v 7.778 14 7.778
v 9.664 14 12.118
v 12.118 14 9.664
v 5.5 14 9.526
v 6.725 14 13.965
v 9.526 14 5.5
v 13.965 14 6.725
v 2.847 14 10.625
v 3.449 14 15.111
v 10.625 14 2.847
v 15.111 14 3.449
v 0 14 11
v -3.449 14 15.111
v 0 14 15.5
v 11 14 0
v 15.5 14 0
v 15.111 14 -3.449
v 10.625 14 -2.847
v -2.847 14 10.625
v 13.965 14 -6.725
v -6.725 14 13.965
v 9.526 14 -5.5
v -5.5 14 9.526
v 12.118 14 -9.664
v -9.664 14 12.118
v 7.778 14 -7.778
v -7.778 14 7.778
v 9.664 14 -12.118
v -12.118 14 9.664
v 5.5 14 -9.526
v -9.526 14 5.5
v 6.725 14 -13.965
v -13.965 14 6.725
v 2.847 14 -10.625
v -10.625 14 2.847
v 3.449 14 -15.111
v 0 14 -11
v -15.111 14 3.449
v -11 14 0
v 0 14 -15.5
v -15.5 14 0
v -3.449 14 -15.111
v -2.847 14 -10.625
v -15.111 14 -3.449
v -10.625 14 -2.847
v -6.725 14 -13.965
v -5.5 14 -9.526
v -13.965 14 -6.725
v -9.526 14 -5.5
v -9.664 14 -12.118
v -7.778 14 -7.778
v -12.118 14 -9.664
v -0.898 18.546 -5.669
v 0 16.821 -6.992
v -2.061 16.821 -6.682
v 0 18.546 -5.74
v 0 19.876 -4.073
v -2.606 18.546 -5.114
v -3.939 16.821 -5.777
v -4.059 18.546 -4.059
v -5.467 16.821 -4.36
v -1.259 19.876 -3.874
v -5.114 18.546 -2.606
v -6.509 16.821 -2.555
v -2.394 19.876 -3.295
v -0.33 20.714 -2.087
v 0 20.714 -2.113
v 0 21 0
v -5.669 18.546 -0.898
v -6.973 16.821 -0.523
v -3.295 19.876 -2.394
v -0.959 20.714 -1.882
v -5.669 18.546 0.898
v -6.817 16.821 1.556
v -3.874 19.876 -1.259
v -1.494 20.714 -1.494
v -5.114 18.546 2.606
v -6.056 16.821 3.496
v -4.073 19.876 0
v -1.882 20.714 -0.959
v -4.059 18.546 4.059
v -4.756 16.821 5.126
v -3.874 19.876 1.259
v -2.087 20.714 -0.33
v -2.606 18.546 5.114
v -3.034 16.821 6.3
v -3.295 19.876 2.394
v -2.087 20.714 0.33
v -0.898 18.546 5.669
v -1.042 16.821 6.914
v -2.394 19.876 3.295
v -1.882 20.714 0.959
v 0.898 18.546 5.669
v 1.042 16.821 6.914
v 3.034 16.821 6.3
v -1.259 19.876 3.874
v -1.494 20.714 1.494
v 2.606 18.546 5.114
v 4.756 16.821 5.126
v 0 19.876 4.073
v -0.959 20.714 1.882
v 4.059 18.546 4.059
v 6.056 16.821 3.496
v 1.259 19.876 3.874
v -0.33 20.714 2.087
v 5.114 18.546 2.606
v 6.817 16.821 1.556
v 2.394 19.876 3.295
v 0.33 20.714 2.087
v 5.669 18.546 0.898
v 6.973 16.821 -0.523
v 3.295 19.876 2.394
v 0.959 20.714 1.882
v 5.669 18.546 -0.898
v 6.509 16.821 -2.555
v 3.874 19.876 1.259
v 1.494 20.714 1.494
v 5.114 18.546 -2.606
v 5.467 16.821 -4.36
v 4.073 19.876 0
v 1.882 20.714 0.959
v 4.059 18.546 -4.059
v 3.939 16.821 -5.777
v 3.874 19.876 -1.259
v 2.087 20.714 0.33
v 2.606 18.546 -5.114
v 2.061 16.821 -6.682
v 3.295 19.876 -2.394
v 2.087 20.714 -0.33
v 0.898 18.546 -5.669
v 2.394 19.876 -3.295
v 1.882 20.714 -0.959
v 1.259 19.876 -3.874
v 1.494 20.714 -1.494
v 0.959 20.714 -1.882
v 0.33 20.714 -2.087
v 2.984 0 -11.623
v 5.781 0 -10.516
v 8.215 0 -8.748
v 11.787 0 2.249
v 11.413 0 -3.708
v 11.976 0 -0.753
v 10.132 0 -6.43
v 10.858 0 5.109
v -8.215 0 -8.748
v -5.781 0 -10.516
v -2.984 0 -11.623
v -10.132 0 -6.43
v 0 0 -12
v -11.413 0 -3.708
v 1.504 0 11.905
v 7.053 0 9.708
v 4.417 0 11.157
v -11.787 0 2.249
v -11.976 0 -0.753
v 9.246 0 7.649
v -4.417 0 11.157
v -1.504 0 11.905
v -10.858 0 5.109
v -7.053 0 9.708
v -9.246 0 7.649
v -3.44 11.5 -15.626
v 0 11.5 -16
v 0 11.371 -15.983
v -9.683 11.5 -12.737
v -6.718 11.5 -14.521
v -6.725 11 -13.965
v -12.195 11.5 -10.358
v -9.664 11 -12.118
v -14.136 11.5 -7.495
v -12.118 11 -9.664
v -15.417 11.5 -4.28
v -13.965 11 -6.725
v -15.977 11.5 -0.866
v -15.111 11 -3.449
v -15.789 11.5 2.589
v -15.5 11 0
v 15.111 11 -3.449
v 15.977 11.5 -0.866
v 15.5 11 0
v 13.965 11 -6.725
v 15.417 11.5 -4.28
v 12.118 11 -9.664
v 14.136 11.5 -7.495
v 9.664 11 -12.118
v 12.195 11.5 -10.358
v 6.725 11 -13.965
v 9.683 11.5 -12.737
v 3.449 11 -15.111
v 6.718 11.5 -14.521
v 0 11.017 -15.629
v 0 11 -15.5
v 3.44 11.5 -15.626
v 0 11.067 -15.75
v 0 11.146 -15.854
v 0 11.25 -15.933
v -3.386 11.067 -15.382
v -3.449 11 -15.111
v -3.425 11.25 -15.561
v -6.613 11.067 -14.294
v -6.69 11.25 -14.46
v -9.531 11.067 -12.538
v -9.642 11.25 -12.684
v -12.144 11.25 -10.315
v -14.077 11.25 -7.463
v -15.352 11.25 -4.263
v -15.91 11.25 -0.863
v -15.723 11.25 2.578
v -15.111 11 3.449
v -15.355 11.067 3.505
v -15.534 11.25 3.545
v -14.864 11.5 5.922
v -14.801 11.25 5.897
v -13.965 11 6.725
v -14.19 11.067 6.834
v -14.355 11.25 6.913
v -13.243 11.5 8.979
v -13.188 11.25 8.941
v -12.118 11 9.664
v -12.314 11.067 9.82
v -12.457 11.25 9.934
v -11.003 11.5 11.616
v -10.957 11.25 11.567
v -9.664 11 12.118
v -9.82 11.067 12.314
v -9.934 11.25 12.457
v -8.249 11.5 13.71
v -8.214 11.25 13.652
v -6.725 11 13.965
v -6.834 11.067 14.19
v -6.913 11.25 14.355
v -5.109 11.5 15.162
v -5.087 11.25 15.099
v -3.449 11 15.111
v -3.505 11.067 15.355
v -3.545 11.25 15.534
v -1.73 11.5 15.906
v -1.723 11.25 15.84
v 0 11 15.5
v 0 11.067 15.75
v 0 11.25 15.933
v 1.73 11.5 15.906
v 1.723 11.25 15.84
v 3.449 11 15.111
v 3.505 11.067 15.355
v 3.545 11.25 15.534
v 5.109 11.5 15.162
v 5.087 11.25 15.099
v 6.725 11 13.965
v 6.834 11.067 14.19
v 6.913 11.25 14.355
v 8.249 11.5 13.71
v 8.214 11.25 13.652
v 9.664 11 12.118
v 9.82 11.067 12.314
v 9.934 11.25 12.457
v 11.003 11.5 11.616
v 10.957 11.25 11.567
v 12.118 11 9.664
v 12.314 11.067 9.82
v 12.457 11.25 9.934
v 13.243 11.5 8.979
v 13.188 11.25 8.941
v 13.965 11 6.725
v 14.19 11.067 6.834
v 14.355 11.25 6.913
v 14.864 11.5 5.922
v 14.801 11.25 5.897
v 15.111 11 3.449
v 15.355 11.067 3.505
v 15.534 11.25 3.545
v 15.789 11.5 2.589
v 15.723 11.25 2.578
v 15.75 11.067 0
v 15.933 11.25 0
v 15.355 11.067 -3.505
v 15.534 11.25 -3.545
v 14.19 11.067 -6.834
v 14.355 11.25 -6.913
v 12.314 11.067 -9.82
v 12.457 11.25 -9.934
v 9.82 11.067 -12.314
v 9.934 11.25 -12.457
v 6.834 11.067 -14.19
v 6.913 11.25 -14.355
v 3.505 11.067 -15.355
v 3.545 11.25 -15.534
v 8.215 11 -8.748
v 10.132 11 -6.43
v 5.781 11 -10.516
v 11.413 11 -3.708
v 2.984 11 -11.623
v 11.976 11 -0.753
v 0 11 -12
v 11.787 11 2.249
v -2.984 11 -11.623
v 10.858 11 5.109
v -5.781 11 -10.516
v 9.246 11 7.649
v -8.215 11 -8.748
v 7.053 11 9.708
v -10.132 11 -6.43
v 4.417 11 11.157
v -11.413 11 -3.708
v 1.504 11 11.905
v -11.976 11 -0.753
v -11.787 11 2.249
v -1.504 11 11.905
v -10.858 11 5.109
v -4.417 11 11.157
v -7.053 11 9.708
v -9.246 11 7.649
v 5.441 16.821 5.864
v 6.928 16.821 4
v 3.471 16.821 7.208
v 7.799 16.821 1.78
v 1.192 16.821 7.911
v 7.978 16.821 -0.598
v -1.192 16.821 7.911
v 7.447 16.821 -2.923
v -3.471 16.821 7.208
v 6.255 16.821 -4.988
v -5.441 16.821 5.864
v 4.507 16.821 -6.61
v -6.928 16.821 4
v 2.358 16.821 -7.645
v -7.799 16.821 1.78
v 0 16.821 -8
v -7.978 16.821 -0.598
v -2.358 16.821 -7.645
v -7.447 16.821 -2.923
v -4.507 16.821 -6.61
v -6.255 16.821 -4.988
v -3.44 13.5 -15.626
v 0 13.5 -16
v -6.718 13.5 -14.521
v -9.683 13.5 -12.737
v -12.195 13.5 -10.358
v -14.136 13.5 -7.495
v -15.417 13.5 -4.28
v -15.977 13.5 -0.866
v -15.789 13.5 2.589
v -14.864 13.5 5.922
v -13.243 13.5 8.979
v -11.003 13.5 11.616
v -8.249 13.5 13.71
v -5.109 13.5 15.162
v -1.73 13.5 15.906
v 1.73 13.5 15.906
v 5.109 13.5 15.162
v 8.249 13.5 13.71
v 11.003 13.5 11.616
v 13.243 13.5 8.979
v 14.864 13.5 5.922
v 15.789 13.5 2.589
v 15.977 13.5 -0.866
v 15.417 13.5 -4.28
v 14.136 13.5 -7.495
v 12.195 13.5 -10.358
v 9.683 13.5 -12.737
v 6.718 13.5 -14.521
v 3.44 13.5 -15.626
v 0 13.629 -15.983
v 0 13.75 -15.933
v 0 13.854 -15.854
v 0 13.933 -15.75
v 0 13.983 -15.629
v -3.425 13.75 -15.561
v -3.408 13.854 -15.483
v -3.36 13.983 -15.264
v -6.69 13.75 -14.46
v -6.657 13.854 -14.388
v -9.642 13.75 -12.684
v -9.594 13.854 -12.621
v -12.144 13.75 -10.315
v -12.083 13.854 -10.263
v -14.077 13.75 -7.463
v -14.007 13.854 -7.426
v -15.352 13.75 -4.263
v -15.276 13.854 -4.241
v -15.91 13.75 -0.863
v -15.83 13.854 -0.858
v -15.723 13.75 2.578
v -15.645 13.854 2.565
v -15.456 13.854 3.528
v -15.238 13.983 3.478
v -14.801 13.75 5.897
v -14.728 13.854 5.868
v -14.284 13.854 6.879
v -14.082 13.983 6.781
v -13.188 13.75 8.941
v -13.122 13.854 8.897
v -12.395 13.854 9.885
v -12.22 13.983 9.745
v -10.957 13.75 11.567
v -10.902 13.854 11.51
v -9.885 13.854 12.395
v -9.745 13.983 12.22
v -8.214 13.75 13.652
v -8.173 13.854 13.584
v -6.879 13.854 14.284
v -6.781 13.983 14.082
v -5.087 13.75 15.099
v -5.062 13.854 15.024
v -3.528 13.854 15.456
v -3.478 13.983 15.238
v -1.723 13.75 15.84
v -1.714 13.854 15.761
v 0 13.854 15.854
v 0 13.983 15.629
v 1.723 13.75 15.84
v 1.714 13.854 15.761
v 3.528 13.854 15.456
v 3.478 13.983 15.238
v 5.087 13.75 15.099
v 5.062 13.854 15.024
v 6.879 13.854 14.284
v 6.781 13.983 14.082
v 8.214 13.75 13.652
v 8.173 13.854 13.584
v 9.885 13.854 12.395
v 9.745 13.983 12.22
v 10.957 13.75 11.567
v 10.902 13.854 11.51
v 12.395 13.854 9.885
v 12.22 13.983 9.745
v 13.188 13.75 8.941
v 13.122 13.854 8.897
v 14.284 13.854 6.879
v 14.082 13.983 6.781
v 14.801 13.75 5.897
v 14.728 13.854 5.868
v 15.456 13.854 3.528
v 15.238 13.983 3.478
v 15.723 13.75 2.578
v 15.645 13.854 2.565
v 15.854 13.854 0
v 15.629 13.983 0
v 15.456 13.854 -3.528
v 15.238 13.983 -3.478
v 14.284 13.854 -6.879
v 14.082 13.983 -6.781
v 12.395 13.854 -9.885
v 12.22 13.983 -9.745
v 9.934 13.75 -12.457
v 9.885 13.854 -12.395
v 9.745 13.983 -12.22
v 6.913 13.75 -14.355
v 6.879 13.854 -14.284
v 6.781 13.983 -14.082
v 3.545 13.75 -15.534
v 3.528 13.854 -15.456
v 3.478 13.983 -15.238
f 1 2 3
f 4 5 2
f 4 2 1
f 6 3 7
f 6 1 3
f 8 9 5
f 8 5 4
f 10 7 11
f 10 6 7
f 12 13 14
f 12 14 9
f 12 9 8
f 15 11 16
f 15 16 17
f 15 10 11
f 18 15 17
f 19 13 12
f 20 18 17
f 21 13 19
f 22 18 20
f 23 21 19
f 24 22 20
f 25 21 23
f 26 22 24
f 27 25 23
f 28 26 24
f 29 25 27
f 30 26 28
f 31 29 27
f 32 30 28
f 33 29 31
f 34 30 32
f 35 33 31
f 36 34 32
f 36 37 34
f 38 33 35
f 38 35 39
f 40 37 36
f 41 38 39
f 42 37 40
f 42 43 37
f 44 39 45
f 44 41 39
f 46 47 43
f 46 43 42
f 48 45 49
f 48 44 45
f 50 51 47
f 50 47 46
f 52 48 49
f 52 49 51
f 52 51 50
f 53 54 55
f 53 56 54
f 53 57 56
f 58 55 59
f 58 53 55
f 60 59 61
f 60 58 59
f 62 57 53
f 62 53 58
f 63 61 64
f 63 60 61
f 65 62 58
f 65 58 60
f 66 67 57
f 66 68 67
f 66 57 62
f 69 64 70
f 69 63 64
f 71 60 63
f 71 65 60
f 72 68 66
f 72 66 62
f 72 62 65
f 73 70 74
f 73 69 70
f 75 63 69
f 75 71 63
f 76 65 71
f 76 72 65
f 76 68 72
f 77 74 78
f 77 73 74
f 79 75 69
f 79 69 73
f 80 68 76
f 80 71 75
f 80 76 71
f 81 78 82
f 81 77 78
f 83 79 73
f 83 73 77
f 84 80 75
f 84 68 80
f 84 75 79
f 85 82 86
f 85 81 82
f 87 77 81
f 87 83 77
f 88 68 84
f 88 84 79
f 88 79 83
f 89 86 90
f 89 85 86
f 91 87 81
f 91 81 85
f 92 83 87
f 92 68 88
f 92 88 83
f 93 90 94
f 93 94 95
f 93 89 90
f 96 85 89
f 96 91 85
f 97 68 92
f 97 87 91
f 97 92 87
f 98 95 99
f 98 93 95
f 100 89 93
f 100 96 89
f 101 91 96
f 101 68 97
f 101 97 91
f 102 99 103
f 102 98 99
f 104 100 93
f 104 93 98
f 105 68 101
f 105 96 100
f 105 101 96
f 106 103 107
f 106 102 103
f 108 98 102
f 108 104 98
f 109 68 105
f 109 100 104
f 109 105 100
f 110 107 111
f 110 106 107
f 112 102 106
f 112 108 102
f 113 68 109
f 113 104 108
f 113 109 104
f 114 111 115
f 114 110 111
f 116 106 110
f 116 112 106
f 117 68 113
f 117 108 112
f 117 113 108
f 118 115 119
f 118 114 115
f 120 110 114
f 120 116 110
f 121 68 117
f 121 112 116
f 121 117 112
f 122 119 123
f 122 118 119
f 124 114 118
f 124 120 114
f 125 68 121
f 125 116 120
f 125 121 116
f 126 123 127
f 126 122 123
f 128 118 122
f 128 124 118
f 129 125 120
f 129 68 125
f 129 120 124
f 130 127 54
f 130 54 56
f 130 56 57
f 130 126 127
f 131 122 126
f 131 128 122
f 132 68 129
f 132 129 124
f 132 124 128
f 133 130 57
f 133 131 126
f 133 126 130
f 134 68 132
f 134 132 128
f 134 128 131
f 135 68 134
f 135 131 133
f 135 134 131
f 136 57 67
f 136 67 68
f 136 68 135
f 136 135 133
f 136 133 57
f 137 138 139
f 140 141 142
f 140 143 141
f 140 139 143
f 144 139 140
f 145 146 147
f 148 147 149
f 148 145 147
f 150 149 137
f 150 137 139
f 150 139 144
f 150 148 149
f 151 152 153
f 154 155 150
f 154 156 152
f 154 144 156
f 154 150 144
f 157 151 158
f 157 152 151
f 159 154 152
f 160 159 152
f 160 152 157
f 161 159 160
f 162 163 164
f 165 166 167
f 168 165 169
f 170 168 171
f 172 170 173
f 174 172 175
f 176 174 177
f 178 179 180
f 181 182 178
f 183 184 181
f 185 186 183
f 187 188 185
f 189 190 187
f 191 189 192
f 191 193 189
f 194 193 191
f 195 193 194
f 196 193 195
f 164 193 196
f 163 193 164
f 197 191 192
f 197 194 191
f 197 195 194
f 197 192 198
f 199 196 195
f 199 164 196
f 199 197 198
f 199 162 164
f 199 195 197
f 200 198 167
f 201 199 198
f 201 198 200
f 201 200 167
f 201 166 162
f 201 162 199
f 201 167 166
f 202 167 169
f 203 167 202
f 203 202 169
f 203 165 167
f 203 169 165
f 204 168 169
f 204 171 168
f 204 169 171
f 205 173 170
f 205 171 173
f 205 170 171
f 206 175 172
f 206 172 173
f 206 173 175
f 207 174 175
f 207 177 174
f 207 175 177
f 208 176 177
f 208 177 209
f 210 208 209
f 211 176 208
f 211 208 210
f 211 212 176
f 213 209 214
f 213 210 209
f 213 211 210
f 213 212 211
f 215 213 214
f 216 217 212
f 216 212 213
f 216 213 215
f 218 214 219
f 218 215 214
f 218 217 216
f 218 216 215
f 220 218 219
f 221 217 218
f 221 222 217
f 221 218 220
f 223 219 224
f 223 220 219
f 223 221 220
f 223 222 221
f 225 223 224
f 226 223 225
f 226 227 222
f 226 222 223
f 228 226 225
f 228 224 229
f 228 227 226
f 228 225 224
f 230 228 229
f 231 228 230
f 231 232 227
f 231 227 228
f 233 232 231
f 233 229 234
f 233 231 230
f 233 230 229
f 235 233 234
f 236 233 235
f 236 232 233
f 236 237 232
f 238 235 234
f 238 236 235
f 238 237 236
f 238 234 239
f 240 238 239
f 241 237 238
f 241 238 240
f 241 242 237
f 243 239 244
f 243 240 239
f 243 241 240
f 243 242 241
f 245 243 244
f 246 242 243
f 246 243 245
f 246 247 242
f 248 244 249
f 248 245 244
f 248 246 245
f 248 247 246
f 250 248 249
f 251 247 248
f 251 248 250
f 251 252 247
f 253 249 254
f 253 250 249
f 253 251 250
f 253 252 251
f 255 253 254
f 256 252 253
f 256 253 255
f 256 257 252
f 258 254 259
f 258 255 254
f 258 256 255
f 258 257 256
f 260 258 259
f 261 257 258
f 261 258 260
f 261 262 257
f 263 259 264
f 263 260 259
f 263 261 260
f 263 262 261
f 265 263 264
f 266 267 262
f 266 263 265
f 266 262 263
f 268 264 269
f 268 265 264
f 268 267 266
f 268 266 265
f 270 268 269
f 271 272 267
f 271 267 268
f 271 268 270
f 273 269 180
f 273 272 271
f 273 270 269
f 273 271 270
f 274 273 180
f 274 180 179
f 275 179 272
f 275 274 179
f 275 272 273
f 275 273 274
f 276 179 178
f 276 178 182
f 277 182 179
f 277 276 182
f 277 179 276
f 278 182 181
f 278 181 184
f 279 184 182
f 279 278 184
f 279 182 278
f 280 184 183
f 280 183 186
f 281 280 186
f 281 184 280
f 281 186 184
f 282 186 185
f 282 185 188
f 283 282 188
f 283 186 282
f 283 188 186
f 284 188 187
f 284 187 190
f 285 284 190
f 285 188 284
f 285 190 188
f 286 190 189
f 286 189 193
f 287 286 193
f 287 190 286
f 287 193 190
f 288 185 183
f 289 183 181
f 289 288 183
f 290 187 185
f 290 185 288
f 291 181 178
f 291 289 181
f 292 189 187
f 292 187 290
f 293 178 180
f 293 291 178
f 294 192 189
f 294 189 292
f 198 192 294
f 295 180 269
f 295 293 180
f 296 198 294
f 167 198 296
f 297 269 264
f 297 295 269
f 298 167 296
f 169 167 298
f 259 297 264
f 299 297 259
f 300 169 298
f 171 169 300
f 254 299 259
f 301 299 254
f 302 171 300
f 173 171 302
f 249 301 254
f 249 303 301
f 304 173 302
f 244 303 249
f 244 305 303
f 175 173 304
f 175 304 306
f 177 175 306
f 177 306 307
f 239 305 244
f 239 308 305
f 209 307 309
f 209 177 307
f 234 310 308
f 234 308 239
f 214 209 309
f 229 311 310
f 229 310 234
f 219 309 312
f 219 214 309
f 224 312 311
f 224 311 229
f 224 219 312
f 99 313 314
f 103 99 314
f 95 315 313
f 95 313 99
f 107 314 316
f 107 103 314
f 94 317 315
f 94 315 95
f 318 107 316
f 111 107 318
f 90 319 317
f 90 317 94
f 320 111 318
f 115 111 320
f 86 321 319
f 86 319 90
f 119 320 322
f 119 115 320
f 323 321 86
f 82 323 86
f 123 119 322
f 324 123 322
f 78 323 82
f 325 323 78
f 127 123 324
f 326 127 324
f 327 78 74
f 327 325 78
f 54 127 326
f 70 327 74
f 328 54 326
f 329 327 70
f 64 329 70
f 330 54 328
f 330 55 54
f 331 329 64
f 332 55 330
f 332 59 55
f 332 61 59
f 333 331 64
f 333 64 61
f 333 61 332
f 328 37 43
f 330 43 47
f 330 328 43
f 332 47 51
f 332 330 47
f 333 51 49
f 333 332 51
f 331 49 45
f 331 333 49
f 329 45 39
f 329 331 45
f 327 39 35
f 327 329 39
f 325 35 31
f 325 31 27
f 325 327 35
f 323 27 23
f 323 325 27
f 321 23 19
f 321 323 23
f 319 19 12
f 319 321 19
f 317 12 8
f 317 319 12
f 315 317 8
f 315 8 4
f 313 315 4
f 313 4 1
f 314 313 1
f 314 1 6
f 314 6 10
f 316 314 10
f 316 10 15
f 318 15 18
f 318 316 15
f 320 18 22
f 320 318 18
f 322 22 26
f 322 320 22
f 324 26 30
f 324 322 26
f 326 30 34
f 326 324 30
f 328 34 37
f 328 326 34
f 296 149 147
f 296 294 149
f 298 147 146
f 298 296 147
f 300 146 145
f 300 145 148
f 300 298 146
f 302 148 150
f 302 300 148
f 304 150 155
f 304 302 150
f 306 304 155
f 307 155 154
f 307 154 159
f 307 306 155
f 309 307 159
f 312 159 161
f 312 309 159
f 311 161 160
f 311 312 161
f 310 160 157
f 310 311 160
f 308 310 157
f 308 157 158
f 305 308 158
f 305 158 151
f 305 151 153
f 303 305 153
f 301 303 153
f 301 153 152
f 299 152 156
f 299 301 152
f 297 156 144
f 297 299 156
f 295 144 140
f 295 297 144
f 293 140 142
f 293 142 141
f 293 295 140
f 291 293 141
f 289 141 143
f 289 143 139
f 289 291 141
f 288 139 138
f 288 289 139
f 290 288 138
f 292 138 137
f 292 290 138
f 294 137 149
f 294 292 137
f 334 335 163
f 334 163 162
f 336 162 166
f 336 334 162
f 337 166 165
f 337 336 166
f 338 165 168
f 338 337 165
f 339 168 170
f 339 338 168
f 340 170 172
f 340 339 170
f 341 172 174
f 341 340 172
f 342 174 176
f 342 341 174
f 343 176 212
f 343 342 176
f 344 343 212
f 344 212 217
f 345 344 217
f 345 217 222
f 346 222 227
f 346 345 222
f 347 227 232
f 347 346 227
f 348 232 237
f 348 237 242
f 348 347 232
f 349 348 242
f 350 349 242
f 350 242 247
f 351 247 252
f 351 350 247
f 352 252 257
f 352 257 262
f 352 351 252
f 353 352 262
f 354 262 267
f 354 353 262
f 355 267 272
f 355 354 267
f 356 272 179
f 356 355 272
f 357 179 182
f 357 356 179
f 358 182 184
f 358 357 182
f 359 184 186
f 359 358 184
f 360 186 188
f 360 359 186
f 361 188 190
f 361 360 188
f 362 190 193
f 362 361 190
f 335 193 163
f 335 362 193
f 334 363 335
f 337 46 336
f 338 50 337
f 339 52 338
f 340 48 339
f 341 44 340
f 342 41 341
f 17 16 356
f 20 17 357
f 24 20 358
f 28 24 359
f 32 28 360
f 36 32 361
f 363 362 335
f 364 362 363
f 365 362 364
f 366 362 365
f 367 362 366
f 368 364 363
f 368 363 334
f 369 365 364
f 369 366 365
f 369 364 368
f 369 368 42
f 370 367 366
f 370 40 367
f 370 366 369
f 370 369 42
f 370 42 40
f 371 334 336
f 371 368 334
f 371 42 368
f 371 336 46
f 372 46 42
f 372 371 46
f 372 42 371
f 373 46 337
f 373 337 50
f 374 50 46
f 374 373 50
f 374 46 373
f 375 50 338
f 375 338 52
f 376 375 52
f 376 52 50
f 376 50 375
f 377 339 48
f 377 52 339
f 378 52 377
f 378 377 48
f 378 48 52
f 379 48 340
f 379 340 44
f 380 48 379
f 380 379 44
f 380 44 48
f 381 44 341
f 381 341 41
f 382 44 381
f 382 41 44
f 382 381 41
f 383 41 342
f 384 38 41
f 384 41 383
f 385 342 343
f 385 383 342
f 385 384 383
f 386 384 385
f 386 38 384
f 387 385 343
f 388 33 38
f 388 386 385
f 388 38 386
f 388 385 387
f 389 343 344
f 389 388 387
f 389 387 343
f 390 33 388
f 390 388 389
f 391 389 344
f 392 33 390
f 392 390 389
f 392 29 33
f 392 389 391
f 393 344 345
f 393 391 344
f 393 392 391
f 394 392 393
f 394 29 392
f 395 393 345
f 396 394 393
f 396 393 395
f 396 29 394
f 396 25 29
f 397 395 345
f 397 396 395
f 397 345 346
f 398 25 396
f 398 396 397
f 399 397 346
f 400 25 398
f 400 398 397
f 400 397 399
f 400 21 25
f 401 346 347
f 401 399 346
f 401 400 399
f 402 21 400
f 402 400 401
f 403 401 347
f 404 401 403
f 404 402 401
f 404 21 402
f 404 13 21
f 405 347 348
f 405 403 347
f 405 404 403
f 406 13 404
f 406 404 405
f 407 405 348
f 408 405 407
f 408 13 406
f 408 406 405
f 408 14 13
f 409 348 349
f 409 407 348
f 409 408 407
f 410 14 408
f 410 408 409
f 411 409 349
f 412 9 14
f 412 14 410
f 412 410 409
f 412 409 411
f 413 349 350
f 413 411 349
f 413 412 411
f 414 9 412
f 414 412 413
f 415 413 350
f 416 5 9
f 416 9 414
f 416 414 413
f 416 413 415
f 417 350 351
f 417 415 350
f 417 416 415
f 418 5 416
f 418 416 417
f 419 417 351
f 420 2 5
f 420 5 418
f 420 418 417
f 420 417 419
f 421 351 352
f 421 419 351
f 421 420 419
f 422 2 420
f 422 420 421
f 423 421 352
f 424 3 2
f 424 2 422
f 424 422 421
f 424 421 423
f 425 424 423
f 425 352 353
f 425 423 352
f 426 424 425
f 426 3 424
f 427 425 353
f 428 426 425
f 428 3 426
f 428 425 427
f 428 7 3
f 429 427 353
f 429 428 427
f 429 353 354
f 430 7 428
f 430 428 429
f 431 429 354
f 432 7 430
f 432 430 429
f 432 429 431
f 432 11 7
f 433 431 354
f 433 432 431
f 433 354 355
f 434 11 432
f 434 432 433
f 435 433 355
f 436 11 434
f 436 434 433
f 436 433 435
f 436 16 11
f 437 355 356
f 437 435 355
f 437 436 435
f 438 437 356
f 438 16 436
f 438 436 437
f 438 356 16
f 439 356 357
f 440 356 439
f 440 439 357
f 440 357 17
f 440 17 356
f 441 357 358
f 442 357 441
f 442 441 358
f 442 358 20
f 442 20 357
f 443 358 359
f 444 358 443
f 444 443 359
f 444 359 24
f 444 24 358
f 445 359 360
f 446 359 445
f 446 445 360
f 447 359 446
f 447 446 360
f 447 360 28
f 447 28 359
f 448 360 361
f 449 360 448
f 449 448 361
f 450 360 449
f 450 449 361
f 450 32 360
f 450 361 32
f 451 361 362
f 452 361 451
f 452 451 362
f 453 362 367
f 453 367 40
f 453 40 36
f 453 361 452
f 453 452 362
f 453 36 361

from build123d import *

# Parameters (mm, degrees)
CONG_1_R = 0.5


with BuildPart() as part:
    # Esquisse1 → Révolution1 (revolve)
    with BuildSketch(Plane.XY, mode=Mode.PRIVATE) as r_volution1_sk:
        with BuildLine():
            Line((0, 0), (-12, 0))
            Line((-12, 0), (-12, 11))
            Line((-12, 11), (-16, 11))
            Line((-16, 11), (-16, 14))
            Line((-16, 14), (-11, 14))
            Line((-11, 14), (-8, 16.821458712))
            Line((-8, 16.821458712), (-6.992498005, 16.821458712))
            ThreePointArc((-6.992498005, 16.821458712), (-4.072936154, 19.875775164), (0, 21))
            Line((0, 21), (0, 0))
        make_face()
    revolve(r_volution1_sk.sketch.rotate(Axis((0, 0, 0), (0, 1, 0)), 270), axis=Axis((0, 0, 0), (0, 1, 0)))

    # Congé1
    cong_1_edges = [part.edges().sort_by_distance(p)[0] for p in [
        (0, 11, 16),
        (0, 14, 16),
    ]]
    fillet(cong_1_edges, radius=CONG_1_R)


solid = part.part
